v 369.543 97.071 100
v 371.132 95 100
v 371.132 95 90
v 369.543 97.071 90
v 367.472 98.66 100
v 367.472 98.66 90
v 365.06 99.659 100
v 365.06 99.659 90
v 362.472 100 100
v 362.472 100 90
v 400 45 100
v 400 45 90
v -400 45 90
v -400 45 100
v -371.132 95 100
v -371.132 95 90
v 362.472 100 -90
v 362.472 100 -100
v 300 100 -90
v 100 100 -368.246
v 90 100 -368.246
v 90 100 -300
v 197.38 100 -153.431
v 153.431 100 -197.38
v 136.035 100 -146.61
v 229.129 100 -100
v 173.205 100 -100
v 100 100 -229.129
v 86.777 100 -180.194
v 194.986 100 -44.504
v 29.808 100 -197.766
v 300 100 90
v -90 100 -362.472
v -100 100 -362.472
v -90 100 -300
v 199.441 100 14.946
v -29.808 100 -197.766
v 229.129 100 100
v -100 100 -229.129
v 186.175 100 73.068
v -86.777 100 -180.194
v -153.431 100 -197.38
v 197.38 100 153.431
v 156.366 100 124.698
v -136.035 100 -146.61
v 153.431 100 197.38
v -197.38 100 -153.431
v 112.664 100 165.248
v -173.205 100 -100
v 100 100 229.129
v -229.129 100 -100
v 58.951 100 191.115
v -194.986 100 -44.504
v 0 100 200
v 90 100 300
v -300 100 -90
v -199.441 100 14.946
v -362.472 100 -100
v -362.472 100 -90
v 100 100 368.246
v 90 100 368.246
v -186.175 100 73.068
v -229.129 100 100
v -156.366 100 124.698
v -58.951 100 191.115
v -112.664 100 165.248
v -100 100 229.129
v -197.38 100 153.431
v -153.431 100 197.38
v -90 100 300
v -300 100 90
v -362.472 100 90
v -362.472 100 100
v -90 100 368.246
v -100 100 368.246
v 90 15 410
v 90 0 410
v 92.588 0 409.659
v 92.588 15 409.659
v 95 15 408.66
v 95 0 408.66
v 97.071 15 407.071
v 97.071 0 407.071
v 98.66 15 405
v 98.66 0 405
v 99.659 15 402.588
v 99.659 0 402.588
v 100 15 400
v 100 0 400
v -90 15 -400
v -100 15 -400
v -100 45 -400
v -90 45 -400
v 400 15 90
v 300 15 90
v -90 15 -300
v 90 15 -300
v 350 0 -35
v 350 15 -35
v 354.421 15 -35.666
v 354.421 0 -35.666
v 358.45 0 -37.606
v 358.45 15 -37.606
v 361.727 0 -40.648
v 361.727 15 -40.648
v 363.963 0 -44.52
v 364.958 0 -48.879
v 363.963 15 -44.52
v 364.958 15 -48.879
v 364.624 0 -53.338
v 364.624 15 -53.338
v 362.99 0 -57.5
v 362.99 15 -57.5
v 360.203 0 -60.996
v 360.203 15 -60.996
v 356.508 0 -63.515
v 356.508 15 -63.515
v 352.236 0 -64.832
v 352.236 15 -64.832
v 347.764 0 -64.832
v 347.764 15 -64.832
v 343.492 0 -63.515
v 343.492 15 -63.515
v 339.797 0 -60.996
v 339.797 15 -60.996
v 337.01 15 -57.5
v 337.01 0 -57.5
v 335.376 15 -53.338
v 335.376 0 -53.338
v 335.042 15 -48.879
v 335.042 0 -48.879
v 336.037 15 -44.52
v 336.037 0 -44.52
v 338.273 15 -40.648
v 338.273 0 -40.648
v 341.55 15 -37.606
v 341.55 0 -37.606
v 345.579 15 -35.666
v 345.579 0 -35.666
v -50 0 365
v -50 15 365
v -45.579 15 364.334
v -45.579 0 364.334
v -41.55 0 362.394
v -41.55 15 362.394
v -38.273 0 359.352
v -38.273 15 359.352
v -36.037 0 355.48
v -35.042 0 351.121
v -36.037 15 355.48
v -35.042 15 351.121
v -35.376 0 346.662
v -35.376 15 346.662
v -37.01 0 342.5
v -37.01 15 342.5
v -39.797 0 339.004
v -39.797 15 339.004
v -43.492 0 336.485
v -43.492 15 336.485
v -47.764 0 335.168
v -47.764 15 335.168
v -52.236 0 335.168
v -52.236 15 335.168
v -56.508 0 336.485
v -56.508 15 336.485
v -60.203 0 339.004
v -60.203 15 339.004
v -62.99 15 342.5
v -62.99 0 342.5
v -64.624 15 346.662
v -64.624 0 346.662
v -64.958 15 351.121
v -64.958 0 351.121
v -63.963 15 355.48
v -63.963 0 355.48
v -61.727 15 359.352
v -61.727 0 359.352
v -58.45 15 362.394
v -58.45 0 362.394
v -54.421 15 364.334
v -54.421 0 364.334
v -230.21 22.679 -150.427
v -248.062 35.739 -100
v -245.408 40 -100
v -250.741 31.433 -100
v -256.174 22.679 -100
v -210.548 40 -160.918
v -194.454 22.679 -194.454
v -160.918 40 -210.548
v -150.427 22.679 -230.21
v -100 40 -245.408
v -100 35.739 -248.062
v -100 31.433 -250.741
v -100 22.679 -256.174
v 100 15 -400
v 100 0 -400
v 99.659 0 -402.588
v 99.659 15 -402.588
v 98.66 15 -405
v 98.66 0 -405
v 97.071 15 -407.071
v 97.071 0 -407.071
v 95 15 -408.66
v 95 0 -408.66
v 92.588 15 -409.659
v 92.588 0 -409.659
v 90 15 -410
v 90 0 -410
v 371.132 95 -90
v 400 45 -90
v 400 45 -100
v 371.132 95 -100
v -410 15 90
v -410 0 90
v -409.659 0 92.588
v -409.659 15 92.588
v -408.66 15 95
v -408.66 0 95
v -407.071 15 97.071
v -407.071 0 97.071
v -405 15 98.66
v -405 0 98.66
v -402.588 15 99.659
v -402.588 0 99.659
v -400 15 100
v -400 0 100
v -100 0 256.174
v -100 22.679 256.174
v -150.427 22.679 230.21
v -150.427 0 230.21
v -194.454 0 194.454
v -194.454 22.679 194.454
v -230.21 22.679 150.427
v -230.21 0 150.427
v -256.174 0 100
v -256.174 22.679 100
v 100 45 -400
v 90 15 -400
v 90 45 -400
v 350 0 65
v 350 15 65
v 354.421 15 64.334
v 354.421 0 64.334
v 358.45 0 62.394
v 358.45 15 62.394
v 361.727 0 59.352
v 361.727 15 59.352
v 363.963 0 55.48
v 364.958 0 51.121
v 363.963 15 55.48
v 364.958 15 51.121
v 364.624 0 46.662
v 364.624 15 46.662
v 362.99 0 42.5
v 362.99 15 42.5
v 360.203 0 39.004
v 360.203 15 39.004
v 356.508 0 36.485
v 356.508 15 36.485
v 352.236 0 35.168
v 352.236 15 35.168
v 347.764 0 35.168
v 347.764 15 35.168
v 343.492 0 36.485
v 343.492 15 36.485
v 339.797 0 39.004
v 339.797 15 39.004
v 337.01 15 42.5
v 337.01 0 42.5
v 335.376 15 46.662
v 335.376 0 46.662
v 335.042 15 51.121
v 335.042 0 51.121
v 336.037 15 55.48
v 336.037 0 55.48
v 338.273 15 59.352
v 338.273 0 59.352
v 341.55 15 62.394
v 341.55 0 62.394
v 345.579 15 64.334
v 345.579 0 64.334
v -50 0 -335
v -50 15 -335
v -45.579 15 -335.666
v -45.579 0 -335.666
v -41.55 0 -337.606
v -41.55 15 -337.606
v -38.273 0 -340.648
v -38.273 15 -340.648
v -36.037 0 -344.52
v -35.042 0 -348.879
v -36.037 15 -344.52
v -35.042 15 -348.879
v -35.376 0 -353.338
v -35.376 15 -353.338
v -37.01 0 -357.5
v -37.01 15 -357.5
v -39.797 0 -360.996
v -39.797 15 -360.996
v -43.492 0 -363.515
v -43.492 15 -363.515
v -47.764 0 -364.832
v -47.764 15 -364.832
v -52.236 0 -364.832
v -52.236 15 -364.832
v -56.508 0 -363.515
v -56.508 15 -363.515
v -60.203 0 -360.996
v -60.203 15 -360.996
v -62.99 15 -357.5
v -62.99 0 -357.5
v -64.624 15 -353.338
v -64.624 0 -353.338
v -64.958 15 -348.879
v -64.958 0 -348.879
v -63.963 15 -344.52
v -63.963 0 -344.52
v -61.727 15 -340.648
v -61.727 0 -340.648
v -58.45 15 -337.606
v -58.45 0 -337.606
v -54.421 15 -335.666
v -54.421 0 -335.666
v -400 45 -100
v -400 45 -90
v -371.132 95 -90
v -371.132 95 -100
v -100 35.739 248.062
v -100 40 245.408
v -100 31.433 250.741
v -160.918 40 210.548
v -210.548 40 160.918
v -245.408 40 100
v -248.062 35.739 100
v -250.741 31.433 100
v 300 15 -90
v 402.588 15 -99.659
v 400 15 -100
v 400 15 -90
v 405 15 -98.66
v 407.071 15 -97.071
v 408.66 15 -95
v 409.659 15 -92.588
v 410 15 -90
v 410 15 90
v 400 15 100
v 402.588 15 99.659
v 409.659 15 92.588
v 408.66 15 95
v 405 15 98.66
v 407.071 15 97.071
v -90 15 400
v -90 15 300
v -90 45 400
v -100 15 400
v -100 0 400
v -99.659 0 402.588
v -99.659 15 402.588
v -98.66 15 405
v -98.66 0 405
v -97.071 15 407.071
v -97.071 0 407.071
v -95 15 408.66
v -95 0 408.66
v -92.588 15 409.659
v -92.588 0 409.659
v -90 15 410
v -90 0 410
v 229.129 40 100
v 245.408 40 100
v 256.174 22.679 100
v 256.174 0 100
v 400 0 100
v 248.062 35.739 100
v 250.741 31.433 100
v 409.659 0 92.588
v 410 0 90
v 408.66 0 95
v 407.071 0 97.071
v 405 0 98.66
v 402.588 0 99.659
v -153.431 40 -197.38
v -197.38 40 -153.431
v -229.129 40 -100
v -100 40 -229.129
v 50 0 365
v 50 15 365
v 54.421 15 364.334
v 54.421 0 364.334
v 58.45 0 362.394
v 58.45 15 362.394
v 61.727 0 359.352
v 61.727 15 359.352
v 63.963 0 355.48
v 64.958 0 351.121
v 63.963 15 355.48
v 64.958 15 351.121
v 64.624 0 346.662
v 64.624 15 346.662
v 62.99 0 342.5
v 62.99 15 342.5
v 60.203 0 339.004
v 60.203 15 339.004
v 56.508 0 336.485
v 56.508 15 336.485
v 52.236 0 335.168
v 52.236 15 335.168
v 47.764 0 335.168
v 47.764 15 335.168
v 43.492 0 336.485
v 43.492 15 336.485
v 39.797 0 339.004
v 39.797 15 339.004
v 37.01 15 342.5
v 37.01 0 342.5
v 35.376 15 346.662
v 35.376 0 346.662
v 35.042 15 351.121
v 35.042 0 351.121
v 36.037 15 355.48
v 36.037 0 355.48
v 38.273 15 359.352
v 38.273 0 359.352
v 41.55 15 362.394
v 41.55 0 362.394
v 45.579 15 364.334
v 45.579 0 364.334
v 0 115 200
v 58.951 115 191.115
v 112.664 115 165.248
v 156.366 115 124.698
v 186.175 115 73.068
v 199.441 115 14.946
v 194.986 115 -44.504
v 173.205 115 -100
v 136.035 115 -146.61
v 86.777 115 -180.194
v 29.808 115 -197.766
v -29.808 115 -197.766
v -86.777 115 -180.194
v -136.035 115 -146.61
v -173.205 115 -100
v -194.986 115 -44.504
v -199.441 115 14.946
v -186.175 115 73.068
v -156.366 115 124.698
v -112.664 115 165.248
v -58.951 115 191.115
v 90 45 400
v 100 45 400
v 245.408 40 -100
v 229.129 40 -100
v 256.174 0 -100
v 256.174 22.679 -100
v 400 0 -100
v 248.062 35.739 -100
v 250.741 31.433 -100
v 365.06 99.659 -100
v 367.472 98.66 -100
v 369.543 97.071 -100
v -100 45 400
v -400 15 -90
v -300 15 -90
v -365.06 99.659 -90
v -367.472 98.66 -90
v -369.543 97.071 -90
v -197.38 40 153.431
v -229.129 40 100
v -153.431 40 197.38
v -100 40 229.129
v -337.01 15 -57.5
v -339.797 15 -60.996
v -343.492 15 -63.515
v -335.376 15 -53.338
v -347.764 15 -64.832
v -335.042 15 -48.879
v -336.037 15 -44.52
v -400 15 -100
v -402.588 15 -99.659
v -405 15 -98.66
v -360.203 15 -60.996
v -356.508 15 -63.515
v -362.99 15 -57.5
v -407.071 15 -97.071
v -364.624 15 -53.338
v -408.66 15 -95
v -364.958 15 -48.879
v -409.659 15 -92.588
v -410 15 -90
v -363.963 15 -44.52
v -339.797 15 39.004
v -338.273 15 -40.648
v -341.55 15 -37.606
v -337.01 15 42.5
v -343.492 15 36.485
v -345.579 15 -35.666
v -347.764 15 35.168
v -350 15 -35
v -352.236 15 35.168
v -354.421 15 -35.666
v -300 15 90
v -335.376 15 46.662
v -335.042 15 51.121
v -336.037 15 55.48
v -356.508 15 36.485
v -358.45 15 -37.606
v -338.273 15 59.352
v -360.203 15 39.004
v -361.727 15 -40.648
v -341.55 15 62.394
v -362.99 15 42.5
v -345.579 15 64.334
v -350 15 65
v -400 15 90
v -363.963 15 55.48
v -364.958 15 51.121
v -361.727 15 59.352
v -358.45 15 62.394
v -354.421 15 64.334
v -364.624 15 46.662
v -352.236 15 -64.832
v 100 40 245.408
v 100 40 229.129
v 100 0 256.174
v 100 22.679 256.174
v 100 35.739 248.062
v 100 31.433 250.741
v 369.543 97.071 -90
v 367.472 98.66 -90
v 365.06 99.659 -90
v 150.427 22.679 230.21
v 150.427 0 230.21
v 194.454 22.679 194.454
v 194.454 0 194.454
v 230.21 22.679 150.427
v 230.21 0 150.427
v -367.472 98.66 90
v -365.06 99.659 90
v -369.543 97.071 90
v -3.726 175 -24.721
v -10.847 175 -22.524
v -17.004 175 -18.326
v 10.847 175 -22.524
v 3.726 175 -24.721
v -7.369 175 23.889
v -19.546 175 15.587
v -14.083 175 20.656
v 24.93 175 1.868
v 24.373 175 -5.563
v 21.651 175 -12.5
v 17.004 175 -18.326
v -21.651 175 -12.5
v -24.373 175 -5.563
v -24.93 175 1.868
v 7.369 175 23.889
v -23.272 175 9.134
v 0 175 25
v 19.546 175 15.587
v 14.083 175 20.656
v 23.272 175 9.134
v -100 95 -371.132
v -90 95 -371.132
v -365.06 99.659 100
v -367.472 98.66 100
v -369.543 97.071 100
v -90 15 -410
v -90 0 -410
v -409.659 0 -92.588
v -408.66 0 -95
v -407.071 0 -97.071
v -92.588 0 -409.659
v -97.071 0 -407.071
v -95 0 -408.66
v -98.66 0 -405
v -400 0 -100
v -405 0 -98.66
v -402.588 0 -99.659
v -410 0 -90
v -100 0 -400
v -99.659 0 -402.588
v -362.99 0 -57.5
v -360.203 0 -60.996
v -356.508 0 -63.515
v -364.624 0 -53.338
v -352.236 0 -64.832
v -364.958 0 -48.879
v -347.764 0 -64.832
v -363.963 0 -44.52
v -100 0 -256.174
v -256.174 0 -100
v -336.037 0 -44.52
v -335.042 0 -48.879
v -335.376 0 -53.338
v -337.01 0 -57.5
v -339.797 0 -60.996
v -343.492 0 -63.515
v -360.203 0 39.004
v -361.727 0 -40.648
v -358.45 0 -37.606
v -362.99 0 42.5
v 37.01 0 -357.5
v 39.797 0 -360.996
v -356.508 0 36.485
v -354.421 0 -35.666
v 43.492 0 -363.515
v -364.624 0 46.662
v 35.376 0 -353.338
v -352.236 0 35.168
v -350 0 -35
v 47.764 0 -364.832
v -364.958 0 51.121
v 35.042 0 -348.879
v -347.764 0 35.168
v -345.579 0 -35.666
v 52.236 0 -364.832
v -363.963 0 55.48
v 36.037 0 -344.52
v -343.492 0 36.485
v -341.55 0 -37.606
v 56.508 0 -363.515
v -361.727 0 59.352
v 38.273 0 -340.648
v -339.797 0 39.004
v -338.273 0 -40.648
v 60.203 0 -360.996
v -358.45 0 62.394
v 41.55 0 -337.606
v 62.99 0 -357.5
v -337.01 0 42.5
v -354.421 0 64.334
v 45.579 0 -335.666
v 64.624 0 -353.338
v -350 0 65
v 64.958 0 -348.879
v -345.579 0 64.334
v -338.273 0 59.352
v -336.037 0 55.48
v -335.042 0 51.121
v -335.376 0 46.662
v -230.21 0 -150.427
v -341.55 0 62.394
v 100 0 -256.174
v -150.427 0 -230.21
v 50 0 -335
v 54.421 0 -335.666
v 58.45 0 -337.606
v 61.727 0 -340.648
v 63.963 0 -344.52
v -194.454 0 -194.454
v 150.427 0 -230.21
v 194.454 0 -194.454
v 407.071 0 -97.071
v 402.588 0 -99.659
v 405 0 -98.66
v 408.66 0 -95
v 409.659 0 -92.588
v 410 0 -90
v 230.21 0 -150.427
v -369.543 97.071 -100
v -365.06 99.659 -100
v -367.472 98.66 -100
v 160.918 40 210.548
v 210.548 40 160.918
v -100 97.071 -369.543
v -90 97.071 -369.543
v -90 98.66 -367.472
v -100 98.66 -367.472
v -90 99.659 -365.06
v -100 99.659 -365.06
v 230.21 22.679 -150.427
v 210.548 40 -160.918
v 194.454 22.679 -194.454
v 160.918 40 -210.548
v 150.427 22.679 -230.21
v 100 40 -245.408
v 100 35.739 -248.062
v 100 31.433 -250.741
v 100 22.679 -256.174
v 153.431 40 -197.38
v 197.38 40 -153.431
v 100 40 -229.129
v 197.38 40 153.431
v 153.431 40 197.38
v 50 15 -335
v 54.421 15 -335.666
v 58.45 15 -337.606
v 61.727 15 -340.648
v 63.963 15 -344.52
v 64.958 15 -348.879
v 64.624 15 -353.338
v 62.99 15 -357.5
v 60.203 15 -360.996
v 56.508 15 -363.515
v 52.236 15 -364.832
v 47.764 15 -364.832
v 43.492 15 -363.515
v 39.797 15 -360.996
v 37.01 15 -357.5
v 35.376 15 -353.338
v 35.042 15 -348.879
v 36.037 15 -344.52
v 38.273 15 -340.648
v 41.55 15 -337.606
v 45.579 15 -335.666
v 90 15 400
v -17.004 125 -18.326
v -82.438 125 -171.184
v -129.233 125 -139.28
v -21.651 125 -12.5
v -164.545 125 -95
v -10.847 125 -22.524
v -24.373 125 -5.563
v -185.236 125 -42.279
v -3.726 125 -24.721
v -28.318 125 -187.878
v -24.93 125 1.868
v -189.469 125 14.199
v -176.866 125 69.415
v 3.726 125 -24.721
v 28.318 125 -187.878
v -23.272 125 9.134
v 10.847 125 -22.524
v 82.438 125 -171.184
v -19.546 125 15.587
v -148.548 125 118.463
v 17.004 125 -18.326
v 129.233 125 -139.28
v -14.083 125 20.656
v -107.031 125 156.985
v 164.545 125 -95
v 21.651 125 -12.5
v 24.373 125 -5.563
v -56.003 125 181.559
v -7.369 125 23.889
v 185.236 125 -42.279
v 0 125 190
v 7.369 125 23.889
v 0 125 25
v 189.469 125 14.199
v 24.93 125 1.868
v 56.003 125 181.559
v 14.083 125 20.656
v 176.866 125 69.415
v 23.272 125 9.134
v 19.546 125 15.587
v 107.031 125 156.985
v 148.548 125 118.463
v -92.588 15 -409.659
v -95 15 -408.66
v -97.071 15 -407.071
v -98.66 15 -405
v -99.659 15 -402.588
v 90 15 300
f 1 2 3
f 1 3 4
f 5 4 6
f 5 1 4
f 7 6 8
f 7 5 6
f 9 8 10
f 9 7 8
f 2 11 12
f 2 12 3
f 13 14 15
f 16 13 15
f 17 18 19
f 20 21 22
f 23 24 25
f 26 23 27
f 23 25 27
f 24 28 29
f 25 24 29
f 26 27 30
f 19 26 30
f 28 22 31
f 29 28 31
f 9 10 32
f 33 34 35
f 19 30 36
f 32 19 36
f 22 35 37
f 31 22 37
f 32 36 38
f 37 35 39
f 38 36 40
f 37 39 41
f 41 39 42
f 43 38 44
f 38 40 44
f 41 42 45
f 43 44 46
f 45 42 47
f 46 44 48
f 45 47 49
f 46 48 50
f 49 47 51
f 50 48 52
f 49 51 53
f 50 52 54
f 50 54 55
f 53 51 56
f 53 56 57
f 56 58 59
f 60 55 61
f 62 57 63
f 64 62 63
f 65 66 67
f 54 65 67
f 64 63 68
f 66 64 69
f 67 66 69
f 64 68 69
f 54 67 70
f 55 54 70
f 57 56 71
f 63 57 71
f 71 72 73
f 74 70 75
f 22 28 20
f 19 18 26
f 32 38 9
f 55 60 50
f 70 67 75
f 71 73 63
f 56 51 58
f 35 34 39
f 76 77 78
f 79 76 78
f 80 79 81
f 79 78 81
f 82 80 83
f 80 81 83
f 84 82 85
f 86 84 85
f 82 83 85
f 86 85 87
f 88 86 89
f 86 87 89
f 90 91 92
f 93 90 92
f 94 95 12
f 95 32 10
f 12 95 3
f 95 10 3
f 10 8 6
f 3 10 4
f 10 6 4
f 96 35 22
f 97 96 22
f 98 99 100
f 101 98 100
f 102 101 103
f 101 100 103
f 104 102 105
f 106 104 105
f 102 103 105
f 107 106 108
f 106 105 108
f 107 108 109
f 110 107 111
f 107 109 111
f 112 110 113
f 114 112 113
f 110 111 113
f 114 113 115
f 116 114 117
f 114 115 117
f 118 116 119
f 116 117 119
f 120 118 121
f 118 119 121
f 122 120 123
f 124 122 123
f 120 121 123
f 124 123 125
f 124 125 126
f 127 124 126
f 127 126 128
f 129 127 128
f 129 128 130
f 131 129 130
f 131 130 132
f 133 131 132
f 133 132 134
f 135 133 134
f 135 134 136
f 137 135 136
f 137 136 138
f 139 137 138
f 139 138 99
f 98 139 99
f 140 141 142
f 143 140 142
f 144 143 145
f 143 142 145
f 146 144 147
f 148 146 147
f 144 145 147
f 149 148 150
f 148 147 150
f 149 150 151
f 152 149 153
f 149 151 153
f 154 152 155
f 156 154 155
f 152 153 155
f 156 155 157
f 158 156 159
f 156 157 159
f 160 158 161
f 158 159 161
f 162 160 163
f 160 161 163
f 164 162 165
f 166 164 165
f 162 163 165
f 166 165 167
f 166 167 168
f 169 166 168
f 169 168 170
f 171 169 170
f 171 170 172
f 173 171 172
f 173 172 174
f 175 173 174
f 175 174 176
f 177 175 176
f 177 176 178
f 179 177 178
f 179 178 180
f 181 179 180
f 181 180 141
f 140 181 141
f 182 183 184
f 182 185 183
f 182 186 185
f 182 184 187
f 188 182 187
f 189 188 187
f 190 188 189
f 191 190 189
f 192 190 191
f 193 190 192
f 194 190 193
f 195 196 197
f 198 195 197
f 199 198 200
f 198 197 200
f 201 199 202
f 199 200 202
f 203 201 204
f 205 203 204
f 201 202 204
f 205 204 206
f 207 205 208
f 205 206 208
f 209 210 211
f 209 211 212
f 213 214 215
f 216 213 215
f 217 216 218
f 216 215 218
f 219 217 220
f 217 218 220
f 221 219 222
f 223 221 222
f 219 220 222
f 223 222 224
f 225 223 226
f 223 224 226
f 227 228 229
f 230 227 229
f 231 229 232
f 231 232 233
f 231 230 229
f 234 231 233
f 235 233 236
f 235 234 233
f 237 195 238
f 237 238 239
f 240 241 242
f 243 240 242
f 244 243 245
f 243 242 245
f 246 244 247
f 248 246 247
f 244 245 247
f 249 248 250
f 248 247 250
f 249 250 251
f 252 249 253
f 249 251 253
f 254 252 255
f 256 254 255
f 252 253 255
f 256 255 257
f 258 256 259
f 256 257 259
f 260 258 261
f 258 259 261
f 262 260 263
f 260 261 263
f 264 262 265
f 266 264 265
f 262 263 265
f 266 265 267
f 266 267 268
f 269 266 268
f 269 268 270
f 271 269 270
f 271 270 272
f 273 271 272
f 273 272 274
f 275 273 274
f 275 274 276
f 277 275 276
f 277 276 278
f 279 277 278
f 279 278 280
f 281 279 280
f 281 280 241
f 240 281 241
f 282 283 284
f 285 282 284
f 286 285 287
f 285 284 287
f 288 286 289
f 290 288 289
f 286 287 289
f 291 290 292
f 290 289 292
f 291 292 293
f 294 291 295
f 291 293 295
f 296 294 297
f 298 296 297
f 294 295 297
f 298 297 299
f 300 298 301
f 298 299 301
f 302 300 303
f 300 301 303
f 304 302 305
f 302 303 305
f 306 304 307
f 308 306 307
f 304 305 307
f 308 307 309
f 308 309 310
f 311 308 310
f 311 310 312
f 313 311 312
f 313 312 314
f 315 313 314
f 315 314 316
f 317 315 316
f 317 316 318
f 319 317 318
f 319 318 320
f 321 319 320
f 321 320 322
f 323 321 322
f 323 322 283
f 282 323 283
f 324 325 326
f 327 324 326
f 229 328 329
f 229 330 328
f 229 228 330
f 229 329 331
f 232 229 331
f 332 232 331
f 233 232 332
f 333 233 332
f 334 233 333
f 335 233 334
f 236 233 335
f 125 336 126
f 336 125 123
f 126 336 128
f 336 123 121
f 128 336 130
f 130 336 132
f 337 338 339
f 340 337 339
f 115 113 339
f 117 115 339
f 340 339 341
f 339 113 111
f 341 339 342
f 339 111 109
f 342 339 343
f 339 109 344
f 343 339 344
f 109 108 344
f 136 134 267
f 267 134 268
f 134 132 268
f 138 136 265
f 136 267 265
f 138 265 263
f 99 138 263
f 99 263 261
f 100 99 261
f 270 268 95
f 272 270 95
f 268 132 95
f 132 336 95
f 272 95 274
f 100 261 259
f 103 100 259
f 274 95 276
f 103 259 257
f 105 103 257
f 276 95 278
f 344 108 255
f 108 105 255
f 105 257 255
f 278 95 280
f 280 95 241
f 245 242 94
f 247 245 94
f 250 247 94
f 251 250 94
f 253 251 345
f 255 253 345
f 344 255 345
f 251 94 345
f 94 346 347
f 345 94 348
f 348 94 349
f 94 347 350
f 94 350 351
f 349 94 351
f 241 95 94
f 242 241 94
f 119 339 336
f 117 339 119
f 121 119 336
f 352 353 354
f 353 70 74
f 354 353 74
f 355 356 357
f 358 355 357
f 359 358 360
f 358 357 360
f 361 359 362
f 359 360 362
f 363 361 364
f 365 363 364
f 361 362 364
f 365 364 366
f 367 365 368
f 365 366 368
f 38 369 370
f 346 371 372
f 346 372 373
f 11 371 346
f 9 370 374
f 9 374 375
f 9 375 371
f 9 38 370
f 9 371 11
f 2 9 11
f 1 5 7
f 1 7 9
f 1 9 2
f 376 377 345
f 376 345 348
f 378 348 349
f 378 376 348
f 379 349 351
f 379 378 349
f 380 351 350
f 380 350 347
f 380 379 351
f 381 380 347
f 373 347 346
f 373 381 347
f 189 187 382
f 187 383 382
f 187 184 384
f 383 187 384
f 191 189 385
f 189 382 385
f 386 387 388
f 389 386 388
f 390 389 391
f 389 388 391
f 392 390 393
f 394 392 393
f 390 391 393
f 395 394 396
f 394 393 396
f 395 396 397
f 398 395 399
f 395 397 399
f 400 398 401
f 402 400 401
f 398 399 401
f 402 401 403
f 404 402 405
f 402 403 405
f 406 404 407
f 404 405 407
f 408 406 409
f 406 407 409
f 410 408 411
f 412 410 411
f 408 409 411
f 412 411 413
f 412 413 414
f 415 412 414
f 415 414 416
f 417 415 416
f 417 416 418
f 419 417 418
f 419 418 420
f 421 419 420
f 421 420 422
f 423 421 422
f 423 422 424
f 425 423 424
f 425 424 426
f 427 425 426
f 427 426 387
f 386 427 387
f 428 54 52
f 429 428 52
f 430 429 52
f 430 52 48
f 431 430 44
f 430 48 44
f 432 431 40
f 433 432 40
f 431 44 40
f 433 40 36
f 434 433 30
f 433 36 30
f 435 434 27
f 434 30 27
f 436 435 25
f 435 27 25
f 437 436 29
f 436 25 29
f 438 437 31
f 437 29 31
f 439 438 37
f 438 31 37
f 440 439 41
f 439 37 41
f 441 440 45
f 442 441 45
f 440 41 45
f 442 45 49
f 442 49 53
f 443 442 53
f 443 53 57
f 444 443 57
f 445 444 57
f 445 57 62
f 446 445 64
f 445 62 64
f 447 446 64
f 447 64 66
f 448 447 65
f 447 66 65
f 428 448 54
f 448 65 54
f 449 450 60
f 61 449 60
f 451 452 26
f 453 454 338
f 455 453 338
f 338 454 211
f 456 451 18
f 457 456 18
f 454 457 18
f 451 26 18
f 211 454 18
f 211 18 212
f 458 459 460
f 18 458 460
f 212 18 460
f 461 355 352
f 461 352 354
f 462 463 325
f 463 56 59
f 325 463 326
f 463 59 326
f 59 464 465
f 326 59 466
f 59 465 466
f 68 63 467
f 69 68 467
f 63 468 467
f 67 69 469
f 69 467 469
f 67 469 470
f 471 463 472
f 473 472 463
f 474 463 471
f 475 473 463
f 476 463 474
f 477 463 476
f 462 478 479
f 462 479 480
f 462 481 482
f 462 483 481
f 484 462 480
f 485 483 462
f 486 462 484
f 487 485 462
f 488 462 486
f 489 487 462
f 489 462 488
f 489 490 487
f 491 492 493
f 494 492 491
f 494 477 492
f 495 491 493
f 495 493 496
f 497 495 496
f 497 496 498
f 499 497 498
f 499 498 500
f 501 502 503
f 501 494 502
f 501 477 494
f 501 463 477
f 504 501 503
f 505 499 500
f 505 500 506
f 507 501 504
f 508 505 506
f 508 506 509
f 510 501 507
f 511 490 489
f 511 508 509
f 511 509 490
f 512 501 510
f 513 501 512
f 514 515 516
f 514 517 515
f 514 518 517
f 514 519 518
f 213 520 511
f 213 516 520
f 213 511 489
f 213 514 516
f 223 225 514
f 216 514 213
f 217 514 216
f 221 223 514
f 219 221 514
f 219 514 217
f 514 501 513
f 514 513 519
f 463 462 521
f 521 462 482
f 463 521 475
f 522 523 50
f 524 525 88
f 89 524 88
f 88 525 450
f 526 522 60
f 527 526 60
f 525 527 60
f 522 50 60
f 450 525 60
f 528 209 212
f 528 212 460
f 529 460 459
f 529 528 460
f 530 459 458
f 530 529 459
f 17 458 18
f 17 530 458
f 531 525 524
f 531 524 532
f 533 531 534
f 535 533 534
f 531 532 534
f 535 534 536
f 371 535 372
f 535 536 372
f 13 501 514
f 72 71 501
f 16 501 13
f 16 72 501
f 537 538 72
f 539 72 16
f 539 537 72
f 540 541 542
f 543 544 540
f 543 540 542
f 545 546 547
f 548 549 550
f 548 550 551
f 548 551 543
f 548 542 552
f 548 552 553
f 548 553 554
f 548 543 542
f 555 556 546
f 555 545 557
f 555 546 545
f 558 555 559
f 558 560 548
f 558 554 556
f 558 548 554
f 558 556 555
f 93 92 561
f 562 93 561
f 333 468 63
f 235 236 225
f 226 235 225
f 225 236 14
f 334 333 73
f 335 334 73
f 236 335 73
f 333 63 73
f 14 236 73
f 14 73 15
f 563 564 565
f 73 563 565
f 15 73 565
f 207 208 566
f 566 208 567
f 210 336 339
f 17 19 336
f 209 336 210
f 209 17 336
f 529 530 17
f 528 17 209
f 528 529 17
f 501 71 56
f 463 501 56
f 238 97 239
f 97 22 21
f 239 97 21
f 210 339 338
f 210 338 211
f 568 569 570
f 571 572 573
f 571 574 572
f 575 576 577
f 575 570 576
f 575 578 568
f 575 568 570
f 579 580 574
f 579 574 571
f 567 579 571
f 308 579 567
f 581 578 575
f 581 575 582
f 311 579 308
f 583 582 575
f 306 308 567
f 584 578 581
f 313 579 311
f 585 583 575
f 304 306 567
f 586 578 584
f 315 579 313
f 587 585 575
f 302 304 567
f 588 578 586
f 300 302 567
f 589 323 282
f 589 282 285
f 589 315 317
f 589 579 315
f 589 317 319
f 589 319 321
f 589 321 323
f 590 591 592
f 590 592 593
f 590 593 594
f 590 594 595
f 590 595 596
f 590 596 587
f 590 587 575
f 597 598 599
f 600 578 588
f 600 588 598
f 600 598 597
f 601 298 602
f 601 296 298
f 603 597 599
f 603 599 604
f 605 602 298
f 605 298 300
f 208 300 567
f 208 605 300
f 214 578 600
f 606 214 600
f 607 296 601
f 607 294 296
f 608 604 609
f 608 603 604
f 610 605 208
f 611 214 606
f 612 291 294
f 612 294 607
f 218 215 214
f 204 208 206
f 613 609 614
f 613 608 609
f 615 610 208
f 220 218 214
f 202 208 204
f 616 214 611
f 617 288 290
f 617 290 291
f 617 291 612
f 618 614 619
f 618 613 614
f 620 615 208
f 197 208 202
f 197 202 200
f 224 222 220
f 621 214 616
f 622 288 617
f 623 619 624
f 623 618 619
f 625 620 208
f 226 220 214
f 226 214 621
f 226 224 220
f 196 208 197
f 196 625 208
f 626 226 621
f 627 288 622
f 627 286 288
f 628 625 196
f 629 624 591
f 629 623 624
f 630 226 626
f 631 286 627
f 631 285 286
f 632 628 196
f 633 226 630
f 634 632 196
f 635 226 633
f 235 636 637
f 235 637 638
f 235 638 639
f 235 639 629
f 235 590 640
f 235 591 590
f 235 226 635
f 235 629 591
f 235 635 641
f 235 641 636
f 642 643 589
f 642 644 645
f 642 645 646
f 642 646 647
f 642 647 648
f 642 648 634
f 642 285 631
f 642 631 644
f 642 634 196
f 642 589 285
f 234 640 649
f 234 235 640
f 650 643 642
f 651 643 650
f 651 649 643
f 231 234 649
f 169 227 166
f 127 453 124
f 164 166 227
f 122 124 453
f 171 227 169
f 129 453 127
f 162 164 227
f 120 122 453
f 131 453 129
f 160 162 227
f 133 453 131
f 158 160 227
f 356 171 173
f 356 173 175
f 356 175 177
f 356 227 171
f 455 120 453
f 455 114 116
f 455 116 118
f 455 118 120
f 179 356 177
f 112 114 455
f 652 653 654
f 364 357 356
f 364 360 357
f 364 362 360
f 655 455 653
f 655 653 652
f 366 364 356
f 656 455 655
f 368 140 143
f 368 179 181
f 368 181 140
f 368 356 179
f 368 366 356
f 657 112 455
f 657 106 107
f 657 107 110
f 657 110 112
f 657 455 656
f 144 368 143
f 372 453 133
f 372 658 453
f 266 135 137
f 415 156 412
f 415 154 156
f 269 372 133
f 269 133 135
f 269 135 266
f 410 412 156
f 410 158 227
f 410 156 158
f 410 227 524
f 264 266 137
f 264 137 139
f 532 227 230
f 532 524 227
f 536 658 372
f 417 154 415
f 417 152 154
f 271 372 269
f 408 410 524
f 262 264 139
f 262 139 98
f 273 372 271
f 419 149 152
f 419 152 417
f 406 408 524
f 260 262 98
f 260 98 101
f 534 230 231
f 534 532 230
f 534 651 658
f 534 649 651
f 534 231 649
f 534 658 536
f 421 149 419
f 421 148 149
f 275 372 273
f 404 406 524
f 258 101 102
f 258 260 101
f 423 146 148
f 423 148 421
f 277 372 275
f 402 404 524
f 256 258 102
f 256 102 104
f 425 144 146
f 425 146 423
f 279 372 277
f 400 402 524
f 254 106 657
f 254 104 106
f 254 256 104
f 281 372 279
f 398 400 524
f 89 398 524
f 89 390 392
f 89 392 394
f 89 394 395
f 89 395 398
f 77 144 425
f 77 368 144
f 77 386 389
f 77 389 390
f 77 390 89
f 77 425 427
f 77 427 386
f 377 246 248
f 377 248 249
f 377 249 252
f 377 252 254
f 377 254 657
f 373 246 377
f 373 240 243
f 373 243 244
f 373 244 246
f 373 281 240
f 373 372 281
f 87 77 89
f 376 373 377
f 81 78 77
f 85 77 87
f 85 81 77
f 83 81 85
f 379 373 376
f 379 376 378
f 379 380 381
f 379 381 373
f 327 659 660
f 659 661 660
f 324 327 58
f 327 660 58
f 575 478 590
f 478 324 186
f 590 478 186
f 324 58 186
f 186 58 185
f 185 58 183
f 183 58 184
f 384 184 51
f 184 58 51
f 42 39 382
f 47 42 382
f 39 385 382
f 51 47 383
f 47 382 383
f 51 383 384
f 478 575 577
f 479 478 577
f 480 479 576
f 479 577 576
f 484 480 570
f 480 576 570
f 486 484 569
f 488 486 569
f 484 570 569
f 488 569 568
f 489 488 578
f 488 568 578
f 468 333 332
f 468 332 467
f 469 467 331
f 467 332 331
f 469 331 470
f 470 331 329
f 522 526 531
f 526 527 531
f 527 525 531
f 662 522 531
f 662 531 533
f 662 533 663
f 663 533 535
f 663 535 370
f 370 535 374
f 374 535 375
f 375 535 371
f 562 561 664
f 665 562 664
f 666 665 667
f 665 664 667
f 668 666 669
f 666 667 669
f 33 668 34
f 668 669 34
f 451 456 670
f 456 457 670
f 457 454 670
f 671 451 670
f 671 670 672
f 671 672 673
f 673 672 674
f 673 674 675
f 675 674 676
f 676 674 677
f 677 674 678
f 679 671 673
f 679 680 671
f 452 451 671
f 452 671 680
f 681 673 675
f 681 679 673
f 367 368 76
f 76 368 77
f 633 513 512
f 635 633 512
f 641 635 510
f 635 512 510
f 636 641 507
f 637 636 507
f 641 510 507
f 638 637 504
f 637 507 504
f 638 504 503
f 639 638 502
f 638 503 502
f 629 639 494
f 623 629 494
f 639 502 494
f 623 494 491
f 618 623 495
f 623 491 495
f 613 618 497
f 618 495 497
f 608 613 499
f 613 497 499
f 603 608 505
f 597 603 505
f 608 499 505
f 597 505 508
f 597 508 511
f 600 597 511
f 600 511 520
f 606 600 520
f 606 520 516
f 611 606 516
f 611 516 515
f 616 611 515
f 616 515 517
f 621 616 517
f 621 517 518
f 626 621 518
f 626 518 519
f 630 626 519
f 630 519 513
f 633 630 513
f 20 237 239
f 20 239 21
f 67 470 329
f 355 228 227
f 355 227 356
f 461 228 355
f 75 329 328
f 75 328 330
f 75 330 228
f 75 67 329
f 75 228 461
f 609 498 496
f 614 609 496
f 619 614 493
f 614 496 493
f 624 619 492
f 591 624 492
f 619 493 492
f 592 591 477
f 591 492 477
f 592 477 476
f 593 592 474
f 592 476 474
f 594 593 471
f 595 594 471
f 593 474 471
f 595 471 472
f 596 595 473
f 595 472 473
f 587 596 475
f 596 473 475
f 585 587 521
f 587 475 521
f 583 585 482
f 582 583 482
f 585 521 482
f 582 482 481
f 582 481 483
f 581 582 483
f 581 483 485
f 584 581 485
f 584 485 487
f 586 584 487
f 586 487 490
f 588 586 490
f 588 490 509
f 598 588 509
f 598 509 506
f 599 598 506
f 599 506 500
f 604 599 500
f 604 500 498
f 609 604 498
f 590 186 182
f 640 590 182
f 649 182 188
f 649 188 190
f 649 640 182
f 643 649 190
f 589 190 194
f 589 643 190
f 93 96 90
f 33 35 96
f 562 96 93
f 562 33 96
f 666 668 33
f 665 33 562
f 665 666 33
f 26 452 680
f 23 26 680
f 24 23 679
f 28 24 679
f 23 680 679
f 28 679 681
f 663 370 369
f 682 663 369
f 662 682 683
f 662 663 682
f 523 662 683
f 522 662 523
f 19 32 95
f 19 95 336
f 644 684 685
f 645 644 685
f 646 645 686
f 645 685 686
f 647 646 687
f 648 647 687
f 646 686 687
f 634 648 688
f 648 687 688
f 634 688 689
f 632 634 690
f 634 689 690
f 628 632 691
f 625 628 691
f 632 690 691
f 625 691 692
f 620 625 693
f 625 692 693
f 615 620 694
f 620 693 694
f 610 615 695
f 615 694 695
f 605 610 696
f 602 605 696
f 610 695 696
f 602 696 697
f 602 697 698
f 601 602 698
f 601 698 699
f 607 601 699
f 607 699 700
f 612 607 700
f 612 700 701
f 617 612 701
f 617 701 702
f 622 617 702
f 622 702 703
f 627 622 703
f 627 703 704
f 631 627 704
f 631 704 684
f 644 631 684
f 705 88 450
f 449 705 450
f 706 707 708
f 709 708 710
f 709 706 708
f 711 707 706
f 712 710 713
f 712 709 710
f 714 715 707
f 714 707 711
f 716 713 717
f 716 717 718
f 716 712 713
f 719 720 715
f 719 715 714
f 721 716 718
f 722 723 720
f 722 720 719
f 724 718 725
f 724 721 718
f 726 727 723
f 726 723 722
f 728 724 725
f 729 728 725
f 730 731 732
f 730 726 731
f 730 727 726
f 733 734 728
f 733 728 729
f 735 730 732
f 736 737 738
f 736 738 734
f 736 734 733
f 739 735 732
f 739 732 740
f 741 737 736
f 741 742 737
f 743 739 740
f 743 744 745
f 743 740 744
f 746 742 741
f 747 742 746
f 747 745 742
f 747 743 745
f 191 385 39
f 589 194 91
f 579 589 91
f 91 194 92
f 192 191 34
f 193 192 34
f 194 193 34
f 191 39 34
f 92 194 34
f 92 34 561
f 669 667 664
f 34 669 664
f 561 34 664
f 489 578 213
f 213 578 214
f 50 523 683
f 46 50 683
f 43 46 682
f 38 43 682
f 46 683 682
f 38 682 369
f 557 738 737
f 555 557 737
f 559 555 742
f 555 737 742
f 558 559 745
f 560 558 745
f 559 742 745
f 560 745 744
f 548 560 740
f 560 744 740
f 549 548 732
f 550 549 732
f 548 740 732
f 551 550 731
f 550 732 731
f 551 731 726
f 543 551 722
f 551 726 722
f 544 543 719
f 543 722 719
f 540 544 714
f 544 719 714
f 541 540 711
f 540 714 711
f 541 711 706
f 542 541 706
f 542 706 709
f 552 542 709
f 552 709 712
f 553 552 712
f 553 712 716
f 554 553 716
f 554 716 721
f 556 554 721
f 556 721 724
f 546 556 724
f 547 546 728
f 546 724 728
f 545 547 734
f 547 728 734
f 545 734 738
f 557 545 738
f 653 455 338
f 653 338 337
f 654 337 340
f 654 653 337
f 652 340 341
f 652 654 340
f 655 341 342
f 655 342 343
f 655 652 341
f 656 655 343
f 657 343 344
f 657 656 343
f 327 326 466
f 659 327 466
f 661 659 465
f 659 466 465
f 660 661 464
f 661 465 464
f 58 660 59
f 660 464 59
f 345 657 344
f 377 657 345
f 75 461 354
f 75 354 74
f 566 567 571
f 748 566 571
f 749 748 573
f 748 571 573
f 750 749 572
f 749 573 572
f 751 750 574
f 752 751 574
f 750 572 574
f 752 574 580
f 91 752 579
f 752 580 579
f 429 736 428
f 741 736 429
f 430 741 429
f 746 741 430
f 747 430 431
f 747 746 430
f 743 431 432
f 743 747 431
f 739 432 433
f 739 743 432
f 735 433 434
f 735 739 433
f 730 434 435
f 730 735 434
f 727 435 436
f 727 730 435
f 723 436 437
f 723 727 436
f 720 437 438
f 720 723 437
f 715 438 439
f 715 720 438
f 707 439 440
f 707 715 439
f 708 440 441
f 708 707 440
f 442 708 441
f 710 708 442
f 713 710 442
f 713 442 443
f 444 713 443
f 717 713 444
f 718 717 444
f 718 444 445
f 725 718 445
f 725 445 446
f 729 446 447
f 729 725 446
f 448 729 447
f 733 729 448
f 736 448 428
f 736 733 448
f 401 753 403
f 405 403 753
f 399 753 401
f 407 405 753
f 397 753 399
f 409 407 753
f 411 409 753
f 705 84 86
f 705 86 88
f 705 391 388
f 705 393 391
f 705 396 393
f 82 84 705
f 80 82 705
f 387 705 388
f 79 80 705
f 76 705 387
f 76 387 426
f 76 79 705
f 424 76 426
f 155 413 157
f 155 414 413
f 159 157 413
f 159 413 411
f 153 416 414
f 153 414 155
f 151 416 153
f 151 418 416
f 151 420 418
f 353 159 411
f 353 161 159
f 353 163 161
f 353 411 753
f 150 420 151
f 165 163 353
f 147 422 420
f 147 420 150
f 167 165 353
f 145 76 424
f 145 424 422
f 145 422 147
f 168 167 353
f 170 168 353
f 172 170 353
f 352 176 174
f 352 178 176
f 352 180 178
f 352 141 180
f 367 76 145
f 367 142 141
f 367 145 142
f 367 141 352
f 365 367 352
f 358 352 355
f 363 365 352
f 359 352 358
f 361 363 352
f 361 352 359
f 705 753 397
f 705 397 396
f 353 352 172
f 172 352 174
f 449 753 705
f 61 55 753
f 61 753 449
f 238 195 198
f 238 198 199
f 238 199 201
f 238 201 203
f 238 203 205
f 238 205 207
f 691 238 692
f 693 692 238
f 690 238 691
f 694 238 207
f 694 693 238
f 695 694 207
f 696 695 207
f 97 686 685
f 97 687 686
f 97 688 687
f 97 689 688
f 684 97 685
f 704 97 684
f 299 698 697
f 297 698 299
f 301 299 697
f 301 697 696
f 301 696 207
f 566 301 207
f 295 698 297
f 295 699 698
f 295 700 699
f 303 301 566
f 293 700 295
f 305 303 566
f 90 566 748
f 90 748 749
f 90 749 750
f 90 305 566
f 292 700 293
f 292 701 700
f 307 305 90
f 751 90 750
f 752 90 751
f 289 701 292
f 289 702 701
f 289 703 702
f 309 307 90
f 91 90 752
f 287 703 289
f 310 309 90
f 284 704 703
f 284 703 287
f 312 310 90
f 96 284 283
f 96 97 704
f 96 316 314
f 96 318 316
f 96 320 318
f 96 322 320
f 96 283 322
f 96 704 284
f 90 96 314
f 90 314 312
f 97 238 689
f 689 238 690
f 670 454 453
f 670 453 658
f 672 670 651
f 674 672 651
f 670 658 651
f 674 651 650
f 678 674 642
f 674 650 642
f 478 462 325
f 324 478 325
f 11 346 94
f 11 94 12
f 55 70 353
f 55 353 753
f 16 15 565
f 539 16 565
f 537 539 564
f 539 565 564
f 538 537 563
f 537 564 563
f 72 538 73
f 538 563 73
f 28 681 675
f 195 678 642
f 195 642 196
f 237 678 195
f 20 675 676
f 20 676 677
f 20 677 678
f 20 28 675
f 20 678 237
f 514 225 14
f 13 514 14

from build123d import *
from OCP.BRepFilletAPI import BRepFilletAPI_MakeChamfer

# Parameters (mm, degrees)
SKETCH5_R            = 250
BOSS_EXTRUDE4_DEPTH  = 100
SKETCH6_W            = 200
SKETCH6_H            = 100
SKETCH6_W_2          = 100
SKETCH6_H_2          = 200
BOSS_EXTRUDE5_DEPTH  = 100
BOSS_EXTRUDE6_DEPTH  = 15
BOSS_EXTRUDE7_DEPTH  = 10
BOSS_EXTRUDE8_DEPTH  = 10
SKETCH18_R           = 15
CUT_EXTRUDE2_DEPTH   = 587.024743505
BOSS_EXTRUDE9_DEPTH  = 10
BOSS_EXTRUDE10_START = -10
BOSS_EXTRUDE10_DEPTH = 10
BOSS_EXTRUDE11_DEPTH = 10
BOSS_EXTRUDE12_DEPTH = 10
SKETCH24_R           = 200
BOSS_EXTRUDE13_DEPTH = 25
SKETCH25_R           = 25
BOSS_EXTRUDE14_DEPTH = 50
BOSS_EXTRUDE15_DEPTH = 40
CHAMFER1_SIZE        = 10
CHAMFER1_SIZE2       = 17.320508076
CHAMFER2_SIZE        = 10


with BuildPart() as part:
    # Sketch5 → Boss-Extrude4 (new body)
    with BuildSketch(Plane(origin=(0, 0, 0), x_dir=(1, 0, 0), z_dir=(0, 1, 0))):
        with Locations(Location((0, 0, 0), (0, 0, 270))):
            Circle(SKETCH5_R)
    extrude(amount=BOSS_EXTRUDE4_DEPTH)

    # Sketch6 → Boss-Extrude5 (add)
    with BuildSketch(Plane(origin=(0, 100, 0), x_dir=(1, 0, 0), z_dir=(0, 1, 0))):
        with Locations((0, -250)):
            Rectangle(SKETCH6_W, SKETCH6_H)
        with Locations((0, 250)):
            Rectangle(SKETCH6_W, SKETCH6_H)
        with Locations((250, 0)):
            Rectangle(SKETCH6_W_2, SKETCH6_H_2)
        with Locations((-250, 0)):
            Rectangle(SKETCH6_W_2, SKETCH6_H_2)
    extrude(amount=-BOSS_EXTRUDE5_DEPTH)

    # Sketch10 → Boss-Extrude6 (add)
    with BuildSketch(Plane.XZ):
        with BuildLine():
            Line((-100, 300), (-100, 400))
            ThreePointArc((-100, 400), (-97.071067812, 407.071067812), (-90, 410))
            Line((-90, 410), (90, 410))
            ThreePointArc((90, 410), (97.071067812, 407.071067812), (100, 400))
            Line((100, 400), (100, 300))
            Line((100, 300), (-100, 300))
        make_face()
        with BuildLine():
            Line((100, -310), (100, -400))
            ThreePointArc((100, -400), (97.071067812, -407.071067812), (90, -410))
            Line((90, -410), (-90, -410))
            ThreePointArc((-90, -410), (-97.071067812, -407.071067812), (-100, -400))
            Line((-100, -400), (-100, -300))
            Line((-100, -300), (90, -300))
            Line((90, -300), (100, -300))
            Line((100, -300), (100, -310))
        make_face()
        with BuildLine():
            Line((-300, -100), (-400, -100))
            ThreePointArc((-400, -100), (-407.071067812, -97.071067812), (-410, -90))
            Line((-410, -90), (-410, 90))
            ThreePointArc((-410, 90), (-407.071067812, 97.071067812), (-400, 100))
            Line((-400, 100), (-300, 100))
            Line((-300, 100), (-300, -100))
        make_face()
        with BuildLine():
            Line((300, -100), (400, -100))
            ThreePointArc((400, -100), (407.071067812, -97.071067812), (410, -90))
            Line((410, -90), (410, 90))
            ThreePointArc((410, 90), (407.071067812, 97.071067812), (400, 100))
            Line((400, 100), (300, 100))
            Line((300, 100), (300, -100))
        make_face()
    extrude(amount=-BOSS_EXTRUDE6_DEPTH)

    # Sketch12 → Boss-Extrude7 (add)
    with BuildSketch(Plane(origin=(100, 0, 0), x_dir=(0, 0, -1), z_dir=(1, 0, 0))):
        Polygon((-400, 15), (-400, 45), (-368.245735195, 100), (-300, 100), (-300, 15), align=None)
    extrude(amount=-BOSS_EXTRUDE7_DEPTH)

    # Sketch13 → Boss-Extrude8 (add)
    with BuildSketch(Plane.ZY.offset(100)):
        Polygon((300, 100), (300, 15), (400, 15), (400, 45), (368.245735195, 100), align=None)
    extrude(amount=-BOSS_EXTRUDE8_DEPTH)

    # Sketch18 → Cut-Extrude2 (cut, through all)
    with BuildSketch(Plane(origin=(0, 15, 0), x_dir=(1, 0, 0), z_dir=(0, 1, 0))):
        with Locations(Location((-50, -350, 0), (0, 0, 270))):
            Circle(SKETCH18_R)
        with Locations(Location((50, -350, 0), (0, 0, 270))):
            Circle(SKETCH18_R)
        with Locations(Location((-350, 50, 0), (0, 0, 270))):
            Circle(SKETCH18_R)
        with Locations(Location((-350, -50, 0), (0, 0, 270))):
            Circle(SKETCH18_R)
        with Locations(Location((-50, 350, 0), (0, 0, 270))):
            Circle(SKETCH18_R)
        with Locations(Location((50, 350, 0), (0, 0, 270))):
            Circle(SKETCH18_R)
        with Locations(Location((350, 50, 0), (0, 0, 270))):
            Circle(SKETCH18_R)
        with Locations(Location((350, -50, 0), (0, 0, 270))):
            Circle(SKETCH18_R)
    extrude(amount=-CUT_EXTRUDE2_DEPTH, mode=Mode.SUBTRACT)

    # Sketch19 → Boss-Extrude9 (add)
    with BuildSketch(Plane.XY.offset(100)):
        with BuildLine():
            Line((-400, 15), (-400, 45))
            Line((-400, 45), (-371.132486541, 95))
            ThreePointArc((-371.132486541, 95), (-367.472232503, 98.660254038), (-362.472232503, 100))
            Line((-362.472232503, 100), (-300, 100))
            Line((-300, 100), (-300, 15))
            Line((-300, 15), (-400, 15))
        make_face()
        with BuildLine():
            Line((400, 15), (400, 45))
            Line((400, 45), (371.132486541, 95))
            ThreePointArc((371.132486541, 95), (367.472232503, 98.660254038), (362.472232503, 100))
            Line((362.472232503, 100), (300, 100))
            Line((300, 100), (300, 15))
            Line((300, 15), (400, 15))
        make_face()
    extrude(amount=-BOSS_EXTRUDE9_DEPTH)

    # Sketch20 → Boss-Extrude10 (add)
    with BuildSketch(Plane(origin=(0, 0, -100), x_dir=(-1, 0, 0), z_dir=(0, 0, -1)).offset(BOSS_EXTRUDE10_START)):
        with BuildLine():
            Line((-400, 15), (-400, 45))
            Line((-400, 45), (-371.132486541, 95))
            ThreePointArc((-371.132486541, 95), (-367.472232503, 98.660254038), (-362.472232503, 100))
            Line((-362.472232503, 100), (-300, 100))
            Line((-300, 100), (-300, 15))
            Line((-300, 15), (-400, 15))
        make_face()
        with BuildLine():
            Line((400, 15), (400, 45))
            Line((400, 45), (371.132486541, 95))
            ThreePointArc((371.132486541, 95), (367.472232503, 98.660254038), (362.472232503, 100))
            Line((362.472232503, 100), (300, 100))
            Line((300, 100), (300, 15))
            Line((300, 15), (400, 15))
        make_face()
    extrude(amount=BOSS_EXTRUDE10_DEPTH)

    # Sketch22 → Boss-Extrude11 (add)
    with BuildSketch(Plane(origin=(100, 0, 0), x_dir=(0, 0, -1), z_dir=(1, 0, 0))):
        Polygon((400, 15), (400, 45), (368.245735195, 100), (300, 100), (300, 15), align=None)
    extrude(amount=-BOSS_EXTRUDE11_DEPTH)

    # Sketch23 → Boss-Extrude12 (add)
    with BuildSketch(Plane.ZY.offset(100)):
        with BuildLine():
            Line((-400, 15), (-400, 45))
            Line((-400, 45), (-371.132486541, 95))
            ThreePointArc((-371.132486541, 95), (-367.472232503, 98.660254038), (-362.472232503, 100))
            Line((-362.472232503, 100), (-300, 100))
            Line((-300, 100), (-300, 15))
            Line((-300, 15), (-400, 15))
        make_face()
    extrude(amount=-BOSS_EXTRUDE12_DEPTH)

    # Sketch24 → Boss-Extrude13 (add)
    with BuildSketch(Plane(origin=(0, 100, 0), x_dir=(1, 0, 0), z_dir=(0, 1, 0))):
        with Locations(Location((0, 0, 0), (0, 0, 270))):
            Circle(SKETCH24_R)
    extrude(amount=BOSS_EXTRUDE13_DEPTH)

    # Sketch25 → Boss-Extrude14 (add)
    with BuildSketch(Plane(origin=(0, 125, 0), x_dir=(1, 0, 0), z_dir=(0, 1, 0))):
        with Locations(Location((0, 0, 0), (0, 0, 270))):
            Circle(SKETCH25_R)
    extrude(amount=BOSS_EXTRUDE14_DEPTH)

    # Sketch27 → Boss-Extrude15 (add)
    with BuildSketch(Plane.XZ):
        with BuildLine():
            Line((-256.173769149, 100), (-229.128784748, 100))
            ThreePointArc((-229.128784748, 100), (-176.776695297, 176.776695297), (-100, 229.128784748))
            Line((-100, 229.128784748), (-100, 256.173769149))
            ThreePointArc((-100, 256.173769149), (-194.454364826, 194.454364826), (-256.173769149, 100))
        make_face()
        with BuildLine():
            Line((100, 229.128784748), (100, 256.173769149))
            ThreePointArc((100, 256.173769149), (194.454364826, 194.454364826), (256.173769149, 100))
            Line((256.173769149, 100), (229.128784748, 100))
            ThreePointArc((229.128784748, 100), (176.776695297, 176.776695297), (100, 229.128784748))
        make_face()
        with BuildLine():
            Line((100, -256.173769149), (100, -229.128784748))
            ThreePointArc((100, -229.128784748), (176.776695297, -176.776695297), (229.128784748, -100))
            Line((229.128784748, -100), (256.173769149, -100))
            ThreePointArc((256.173769149, -100), (194.454364826, -194.454364826), (100, -256.173769149))
        make_face()
        with BuildLine():
            Line((-100, -256.173769149), (-100, -229.128784748))
            ThreePointArc((-100, -229.128784748), (-176.776695297, -176.776695297), (-229.128784748, -100))
            Line((-229.128784748, -100), (-256.173769149, -100))
            ThreePointArc((-256.173769149, -100), (-194.454364826, -194.454364826), (-100, -256.173769149))
        make_face()
    extrude(amount=-BOSS_EXTRUDE15_DEPTH)

    # Chamfer1: one chamfer whose edges measure the first distance from different faces: ONE call of the kernel's chamfer builder (chamfer() names one face for all edges)
    chamfer1_edges_1 = [part.edges().sort_by_distance(p)[0] for p in [
        (194.454364826, 40, -194.454364826),
    ]]
    chamfer1_side_1 = [part.faces().sort_by_distance(p)[0] for p in [
        (181.097571565, 40, -181.097571565),
    ]]
    chamfer1_edges_2 = [part.edges().sort_by_distance(p)[0] for p in [
        (194.454364826, 40, 194.454364826),
    ]]
    chamfer1_side_2 = [part.faces().sort_by_distance(p)[0] for p in [
        (181.097571565, 40, 181.097571565),
    ]]
    chamfer1_edges_3 = [part.edges().sort_by_distance(p)[0] for p in [
        (-194.454364826, 40, 194.454364826),
    ]]
    chamfer1_side_3 = [part.faces().sort_by_distance(p)[0] for p in [
        (-181.097571565, 40, 181.097571565),
    ]]
    chamfer1_edges_4 = [part.edges().sort_by_distance(p)[0] for p in [
        (-194.454364826, 40, -194.454364826),
    ]]
    chamfer1_side_4 = [part.faces().sort_by_distance(p)[0] for p in [
        (-181.097571565, 40, -181.097571565),
    ]]
    chamfer1 = BRepFilletAPI_MakeChamfer(part.part.solid().wrapped)
    for e in chamfer1_edges_1:
        chamfer1.Add(CHAMFER1_SIZE, CHAMFER1_SIZE2, e.wrapped, chamfer1_side_1[0].wrapped)  # the first distance lies on this face
    for e in chamfer1_edges_2:
        chamfer1.Add(CHAMFER1_SIZE, CHAMFER1_SIZE2, e.wrapped, chamfer1_side_2[0].wrapped)  # the first distance lies on this face
    for e in chamfer1_edges_3:
        chamfer1.Add(CHAMFER1_SIZE, CHAMFER1_SIZE2, e.wrapped, chamfer1_side_3[0].wrapped)  # the first distance lies on this face
    for e in chamfer1_edges_4:
        chamfer1.Add(CHAMFER1_SIZE, CHAMFER1_SIZE2, e.wrapped, chamfer1_side_4[0].wrapped)  # the first distance lies on this face
    add(Compound.cast(chamfer1.Shape()), mode=Mode.REPLACE)

    # Chamfer2
    chamfer2_edges = [part.edges().sort_by_distance(p)[0] for p in [
        (0, 125, -200),
    ]]
    chamfer(chamfer2_edges, length=CHAMFER2_SIZE)


solid = part.part
